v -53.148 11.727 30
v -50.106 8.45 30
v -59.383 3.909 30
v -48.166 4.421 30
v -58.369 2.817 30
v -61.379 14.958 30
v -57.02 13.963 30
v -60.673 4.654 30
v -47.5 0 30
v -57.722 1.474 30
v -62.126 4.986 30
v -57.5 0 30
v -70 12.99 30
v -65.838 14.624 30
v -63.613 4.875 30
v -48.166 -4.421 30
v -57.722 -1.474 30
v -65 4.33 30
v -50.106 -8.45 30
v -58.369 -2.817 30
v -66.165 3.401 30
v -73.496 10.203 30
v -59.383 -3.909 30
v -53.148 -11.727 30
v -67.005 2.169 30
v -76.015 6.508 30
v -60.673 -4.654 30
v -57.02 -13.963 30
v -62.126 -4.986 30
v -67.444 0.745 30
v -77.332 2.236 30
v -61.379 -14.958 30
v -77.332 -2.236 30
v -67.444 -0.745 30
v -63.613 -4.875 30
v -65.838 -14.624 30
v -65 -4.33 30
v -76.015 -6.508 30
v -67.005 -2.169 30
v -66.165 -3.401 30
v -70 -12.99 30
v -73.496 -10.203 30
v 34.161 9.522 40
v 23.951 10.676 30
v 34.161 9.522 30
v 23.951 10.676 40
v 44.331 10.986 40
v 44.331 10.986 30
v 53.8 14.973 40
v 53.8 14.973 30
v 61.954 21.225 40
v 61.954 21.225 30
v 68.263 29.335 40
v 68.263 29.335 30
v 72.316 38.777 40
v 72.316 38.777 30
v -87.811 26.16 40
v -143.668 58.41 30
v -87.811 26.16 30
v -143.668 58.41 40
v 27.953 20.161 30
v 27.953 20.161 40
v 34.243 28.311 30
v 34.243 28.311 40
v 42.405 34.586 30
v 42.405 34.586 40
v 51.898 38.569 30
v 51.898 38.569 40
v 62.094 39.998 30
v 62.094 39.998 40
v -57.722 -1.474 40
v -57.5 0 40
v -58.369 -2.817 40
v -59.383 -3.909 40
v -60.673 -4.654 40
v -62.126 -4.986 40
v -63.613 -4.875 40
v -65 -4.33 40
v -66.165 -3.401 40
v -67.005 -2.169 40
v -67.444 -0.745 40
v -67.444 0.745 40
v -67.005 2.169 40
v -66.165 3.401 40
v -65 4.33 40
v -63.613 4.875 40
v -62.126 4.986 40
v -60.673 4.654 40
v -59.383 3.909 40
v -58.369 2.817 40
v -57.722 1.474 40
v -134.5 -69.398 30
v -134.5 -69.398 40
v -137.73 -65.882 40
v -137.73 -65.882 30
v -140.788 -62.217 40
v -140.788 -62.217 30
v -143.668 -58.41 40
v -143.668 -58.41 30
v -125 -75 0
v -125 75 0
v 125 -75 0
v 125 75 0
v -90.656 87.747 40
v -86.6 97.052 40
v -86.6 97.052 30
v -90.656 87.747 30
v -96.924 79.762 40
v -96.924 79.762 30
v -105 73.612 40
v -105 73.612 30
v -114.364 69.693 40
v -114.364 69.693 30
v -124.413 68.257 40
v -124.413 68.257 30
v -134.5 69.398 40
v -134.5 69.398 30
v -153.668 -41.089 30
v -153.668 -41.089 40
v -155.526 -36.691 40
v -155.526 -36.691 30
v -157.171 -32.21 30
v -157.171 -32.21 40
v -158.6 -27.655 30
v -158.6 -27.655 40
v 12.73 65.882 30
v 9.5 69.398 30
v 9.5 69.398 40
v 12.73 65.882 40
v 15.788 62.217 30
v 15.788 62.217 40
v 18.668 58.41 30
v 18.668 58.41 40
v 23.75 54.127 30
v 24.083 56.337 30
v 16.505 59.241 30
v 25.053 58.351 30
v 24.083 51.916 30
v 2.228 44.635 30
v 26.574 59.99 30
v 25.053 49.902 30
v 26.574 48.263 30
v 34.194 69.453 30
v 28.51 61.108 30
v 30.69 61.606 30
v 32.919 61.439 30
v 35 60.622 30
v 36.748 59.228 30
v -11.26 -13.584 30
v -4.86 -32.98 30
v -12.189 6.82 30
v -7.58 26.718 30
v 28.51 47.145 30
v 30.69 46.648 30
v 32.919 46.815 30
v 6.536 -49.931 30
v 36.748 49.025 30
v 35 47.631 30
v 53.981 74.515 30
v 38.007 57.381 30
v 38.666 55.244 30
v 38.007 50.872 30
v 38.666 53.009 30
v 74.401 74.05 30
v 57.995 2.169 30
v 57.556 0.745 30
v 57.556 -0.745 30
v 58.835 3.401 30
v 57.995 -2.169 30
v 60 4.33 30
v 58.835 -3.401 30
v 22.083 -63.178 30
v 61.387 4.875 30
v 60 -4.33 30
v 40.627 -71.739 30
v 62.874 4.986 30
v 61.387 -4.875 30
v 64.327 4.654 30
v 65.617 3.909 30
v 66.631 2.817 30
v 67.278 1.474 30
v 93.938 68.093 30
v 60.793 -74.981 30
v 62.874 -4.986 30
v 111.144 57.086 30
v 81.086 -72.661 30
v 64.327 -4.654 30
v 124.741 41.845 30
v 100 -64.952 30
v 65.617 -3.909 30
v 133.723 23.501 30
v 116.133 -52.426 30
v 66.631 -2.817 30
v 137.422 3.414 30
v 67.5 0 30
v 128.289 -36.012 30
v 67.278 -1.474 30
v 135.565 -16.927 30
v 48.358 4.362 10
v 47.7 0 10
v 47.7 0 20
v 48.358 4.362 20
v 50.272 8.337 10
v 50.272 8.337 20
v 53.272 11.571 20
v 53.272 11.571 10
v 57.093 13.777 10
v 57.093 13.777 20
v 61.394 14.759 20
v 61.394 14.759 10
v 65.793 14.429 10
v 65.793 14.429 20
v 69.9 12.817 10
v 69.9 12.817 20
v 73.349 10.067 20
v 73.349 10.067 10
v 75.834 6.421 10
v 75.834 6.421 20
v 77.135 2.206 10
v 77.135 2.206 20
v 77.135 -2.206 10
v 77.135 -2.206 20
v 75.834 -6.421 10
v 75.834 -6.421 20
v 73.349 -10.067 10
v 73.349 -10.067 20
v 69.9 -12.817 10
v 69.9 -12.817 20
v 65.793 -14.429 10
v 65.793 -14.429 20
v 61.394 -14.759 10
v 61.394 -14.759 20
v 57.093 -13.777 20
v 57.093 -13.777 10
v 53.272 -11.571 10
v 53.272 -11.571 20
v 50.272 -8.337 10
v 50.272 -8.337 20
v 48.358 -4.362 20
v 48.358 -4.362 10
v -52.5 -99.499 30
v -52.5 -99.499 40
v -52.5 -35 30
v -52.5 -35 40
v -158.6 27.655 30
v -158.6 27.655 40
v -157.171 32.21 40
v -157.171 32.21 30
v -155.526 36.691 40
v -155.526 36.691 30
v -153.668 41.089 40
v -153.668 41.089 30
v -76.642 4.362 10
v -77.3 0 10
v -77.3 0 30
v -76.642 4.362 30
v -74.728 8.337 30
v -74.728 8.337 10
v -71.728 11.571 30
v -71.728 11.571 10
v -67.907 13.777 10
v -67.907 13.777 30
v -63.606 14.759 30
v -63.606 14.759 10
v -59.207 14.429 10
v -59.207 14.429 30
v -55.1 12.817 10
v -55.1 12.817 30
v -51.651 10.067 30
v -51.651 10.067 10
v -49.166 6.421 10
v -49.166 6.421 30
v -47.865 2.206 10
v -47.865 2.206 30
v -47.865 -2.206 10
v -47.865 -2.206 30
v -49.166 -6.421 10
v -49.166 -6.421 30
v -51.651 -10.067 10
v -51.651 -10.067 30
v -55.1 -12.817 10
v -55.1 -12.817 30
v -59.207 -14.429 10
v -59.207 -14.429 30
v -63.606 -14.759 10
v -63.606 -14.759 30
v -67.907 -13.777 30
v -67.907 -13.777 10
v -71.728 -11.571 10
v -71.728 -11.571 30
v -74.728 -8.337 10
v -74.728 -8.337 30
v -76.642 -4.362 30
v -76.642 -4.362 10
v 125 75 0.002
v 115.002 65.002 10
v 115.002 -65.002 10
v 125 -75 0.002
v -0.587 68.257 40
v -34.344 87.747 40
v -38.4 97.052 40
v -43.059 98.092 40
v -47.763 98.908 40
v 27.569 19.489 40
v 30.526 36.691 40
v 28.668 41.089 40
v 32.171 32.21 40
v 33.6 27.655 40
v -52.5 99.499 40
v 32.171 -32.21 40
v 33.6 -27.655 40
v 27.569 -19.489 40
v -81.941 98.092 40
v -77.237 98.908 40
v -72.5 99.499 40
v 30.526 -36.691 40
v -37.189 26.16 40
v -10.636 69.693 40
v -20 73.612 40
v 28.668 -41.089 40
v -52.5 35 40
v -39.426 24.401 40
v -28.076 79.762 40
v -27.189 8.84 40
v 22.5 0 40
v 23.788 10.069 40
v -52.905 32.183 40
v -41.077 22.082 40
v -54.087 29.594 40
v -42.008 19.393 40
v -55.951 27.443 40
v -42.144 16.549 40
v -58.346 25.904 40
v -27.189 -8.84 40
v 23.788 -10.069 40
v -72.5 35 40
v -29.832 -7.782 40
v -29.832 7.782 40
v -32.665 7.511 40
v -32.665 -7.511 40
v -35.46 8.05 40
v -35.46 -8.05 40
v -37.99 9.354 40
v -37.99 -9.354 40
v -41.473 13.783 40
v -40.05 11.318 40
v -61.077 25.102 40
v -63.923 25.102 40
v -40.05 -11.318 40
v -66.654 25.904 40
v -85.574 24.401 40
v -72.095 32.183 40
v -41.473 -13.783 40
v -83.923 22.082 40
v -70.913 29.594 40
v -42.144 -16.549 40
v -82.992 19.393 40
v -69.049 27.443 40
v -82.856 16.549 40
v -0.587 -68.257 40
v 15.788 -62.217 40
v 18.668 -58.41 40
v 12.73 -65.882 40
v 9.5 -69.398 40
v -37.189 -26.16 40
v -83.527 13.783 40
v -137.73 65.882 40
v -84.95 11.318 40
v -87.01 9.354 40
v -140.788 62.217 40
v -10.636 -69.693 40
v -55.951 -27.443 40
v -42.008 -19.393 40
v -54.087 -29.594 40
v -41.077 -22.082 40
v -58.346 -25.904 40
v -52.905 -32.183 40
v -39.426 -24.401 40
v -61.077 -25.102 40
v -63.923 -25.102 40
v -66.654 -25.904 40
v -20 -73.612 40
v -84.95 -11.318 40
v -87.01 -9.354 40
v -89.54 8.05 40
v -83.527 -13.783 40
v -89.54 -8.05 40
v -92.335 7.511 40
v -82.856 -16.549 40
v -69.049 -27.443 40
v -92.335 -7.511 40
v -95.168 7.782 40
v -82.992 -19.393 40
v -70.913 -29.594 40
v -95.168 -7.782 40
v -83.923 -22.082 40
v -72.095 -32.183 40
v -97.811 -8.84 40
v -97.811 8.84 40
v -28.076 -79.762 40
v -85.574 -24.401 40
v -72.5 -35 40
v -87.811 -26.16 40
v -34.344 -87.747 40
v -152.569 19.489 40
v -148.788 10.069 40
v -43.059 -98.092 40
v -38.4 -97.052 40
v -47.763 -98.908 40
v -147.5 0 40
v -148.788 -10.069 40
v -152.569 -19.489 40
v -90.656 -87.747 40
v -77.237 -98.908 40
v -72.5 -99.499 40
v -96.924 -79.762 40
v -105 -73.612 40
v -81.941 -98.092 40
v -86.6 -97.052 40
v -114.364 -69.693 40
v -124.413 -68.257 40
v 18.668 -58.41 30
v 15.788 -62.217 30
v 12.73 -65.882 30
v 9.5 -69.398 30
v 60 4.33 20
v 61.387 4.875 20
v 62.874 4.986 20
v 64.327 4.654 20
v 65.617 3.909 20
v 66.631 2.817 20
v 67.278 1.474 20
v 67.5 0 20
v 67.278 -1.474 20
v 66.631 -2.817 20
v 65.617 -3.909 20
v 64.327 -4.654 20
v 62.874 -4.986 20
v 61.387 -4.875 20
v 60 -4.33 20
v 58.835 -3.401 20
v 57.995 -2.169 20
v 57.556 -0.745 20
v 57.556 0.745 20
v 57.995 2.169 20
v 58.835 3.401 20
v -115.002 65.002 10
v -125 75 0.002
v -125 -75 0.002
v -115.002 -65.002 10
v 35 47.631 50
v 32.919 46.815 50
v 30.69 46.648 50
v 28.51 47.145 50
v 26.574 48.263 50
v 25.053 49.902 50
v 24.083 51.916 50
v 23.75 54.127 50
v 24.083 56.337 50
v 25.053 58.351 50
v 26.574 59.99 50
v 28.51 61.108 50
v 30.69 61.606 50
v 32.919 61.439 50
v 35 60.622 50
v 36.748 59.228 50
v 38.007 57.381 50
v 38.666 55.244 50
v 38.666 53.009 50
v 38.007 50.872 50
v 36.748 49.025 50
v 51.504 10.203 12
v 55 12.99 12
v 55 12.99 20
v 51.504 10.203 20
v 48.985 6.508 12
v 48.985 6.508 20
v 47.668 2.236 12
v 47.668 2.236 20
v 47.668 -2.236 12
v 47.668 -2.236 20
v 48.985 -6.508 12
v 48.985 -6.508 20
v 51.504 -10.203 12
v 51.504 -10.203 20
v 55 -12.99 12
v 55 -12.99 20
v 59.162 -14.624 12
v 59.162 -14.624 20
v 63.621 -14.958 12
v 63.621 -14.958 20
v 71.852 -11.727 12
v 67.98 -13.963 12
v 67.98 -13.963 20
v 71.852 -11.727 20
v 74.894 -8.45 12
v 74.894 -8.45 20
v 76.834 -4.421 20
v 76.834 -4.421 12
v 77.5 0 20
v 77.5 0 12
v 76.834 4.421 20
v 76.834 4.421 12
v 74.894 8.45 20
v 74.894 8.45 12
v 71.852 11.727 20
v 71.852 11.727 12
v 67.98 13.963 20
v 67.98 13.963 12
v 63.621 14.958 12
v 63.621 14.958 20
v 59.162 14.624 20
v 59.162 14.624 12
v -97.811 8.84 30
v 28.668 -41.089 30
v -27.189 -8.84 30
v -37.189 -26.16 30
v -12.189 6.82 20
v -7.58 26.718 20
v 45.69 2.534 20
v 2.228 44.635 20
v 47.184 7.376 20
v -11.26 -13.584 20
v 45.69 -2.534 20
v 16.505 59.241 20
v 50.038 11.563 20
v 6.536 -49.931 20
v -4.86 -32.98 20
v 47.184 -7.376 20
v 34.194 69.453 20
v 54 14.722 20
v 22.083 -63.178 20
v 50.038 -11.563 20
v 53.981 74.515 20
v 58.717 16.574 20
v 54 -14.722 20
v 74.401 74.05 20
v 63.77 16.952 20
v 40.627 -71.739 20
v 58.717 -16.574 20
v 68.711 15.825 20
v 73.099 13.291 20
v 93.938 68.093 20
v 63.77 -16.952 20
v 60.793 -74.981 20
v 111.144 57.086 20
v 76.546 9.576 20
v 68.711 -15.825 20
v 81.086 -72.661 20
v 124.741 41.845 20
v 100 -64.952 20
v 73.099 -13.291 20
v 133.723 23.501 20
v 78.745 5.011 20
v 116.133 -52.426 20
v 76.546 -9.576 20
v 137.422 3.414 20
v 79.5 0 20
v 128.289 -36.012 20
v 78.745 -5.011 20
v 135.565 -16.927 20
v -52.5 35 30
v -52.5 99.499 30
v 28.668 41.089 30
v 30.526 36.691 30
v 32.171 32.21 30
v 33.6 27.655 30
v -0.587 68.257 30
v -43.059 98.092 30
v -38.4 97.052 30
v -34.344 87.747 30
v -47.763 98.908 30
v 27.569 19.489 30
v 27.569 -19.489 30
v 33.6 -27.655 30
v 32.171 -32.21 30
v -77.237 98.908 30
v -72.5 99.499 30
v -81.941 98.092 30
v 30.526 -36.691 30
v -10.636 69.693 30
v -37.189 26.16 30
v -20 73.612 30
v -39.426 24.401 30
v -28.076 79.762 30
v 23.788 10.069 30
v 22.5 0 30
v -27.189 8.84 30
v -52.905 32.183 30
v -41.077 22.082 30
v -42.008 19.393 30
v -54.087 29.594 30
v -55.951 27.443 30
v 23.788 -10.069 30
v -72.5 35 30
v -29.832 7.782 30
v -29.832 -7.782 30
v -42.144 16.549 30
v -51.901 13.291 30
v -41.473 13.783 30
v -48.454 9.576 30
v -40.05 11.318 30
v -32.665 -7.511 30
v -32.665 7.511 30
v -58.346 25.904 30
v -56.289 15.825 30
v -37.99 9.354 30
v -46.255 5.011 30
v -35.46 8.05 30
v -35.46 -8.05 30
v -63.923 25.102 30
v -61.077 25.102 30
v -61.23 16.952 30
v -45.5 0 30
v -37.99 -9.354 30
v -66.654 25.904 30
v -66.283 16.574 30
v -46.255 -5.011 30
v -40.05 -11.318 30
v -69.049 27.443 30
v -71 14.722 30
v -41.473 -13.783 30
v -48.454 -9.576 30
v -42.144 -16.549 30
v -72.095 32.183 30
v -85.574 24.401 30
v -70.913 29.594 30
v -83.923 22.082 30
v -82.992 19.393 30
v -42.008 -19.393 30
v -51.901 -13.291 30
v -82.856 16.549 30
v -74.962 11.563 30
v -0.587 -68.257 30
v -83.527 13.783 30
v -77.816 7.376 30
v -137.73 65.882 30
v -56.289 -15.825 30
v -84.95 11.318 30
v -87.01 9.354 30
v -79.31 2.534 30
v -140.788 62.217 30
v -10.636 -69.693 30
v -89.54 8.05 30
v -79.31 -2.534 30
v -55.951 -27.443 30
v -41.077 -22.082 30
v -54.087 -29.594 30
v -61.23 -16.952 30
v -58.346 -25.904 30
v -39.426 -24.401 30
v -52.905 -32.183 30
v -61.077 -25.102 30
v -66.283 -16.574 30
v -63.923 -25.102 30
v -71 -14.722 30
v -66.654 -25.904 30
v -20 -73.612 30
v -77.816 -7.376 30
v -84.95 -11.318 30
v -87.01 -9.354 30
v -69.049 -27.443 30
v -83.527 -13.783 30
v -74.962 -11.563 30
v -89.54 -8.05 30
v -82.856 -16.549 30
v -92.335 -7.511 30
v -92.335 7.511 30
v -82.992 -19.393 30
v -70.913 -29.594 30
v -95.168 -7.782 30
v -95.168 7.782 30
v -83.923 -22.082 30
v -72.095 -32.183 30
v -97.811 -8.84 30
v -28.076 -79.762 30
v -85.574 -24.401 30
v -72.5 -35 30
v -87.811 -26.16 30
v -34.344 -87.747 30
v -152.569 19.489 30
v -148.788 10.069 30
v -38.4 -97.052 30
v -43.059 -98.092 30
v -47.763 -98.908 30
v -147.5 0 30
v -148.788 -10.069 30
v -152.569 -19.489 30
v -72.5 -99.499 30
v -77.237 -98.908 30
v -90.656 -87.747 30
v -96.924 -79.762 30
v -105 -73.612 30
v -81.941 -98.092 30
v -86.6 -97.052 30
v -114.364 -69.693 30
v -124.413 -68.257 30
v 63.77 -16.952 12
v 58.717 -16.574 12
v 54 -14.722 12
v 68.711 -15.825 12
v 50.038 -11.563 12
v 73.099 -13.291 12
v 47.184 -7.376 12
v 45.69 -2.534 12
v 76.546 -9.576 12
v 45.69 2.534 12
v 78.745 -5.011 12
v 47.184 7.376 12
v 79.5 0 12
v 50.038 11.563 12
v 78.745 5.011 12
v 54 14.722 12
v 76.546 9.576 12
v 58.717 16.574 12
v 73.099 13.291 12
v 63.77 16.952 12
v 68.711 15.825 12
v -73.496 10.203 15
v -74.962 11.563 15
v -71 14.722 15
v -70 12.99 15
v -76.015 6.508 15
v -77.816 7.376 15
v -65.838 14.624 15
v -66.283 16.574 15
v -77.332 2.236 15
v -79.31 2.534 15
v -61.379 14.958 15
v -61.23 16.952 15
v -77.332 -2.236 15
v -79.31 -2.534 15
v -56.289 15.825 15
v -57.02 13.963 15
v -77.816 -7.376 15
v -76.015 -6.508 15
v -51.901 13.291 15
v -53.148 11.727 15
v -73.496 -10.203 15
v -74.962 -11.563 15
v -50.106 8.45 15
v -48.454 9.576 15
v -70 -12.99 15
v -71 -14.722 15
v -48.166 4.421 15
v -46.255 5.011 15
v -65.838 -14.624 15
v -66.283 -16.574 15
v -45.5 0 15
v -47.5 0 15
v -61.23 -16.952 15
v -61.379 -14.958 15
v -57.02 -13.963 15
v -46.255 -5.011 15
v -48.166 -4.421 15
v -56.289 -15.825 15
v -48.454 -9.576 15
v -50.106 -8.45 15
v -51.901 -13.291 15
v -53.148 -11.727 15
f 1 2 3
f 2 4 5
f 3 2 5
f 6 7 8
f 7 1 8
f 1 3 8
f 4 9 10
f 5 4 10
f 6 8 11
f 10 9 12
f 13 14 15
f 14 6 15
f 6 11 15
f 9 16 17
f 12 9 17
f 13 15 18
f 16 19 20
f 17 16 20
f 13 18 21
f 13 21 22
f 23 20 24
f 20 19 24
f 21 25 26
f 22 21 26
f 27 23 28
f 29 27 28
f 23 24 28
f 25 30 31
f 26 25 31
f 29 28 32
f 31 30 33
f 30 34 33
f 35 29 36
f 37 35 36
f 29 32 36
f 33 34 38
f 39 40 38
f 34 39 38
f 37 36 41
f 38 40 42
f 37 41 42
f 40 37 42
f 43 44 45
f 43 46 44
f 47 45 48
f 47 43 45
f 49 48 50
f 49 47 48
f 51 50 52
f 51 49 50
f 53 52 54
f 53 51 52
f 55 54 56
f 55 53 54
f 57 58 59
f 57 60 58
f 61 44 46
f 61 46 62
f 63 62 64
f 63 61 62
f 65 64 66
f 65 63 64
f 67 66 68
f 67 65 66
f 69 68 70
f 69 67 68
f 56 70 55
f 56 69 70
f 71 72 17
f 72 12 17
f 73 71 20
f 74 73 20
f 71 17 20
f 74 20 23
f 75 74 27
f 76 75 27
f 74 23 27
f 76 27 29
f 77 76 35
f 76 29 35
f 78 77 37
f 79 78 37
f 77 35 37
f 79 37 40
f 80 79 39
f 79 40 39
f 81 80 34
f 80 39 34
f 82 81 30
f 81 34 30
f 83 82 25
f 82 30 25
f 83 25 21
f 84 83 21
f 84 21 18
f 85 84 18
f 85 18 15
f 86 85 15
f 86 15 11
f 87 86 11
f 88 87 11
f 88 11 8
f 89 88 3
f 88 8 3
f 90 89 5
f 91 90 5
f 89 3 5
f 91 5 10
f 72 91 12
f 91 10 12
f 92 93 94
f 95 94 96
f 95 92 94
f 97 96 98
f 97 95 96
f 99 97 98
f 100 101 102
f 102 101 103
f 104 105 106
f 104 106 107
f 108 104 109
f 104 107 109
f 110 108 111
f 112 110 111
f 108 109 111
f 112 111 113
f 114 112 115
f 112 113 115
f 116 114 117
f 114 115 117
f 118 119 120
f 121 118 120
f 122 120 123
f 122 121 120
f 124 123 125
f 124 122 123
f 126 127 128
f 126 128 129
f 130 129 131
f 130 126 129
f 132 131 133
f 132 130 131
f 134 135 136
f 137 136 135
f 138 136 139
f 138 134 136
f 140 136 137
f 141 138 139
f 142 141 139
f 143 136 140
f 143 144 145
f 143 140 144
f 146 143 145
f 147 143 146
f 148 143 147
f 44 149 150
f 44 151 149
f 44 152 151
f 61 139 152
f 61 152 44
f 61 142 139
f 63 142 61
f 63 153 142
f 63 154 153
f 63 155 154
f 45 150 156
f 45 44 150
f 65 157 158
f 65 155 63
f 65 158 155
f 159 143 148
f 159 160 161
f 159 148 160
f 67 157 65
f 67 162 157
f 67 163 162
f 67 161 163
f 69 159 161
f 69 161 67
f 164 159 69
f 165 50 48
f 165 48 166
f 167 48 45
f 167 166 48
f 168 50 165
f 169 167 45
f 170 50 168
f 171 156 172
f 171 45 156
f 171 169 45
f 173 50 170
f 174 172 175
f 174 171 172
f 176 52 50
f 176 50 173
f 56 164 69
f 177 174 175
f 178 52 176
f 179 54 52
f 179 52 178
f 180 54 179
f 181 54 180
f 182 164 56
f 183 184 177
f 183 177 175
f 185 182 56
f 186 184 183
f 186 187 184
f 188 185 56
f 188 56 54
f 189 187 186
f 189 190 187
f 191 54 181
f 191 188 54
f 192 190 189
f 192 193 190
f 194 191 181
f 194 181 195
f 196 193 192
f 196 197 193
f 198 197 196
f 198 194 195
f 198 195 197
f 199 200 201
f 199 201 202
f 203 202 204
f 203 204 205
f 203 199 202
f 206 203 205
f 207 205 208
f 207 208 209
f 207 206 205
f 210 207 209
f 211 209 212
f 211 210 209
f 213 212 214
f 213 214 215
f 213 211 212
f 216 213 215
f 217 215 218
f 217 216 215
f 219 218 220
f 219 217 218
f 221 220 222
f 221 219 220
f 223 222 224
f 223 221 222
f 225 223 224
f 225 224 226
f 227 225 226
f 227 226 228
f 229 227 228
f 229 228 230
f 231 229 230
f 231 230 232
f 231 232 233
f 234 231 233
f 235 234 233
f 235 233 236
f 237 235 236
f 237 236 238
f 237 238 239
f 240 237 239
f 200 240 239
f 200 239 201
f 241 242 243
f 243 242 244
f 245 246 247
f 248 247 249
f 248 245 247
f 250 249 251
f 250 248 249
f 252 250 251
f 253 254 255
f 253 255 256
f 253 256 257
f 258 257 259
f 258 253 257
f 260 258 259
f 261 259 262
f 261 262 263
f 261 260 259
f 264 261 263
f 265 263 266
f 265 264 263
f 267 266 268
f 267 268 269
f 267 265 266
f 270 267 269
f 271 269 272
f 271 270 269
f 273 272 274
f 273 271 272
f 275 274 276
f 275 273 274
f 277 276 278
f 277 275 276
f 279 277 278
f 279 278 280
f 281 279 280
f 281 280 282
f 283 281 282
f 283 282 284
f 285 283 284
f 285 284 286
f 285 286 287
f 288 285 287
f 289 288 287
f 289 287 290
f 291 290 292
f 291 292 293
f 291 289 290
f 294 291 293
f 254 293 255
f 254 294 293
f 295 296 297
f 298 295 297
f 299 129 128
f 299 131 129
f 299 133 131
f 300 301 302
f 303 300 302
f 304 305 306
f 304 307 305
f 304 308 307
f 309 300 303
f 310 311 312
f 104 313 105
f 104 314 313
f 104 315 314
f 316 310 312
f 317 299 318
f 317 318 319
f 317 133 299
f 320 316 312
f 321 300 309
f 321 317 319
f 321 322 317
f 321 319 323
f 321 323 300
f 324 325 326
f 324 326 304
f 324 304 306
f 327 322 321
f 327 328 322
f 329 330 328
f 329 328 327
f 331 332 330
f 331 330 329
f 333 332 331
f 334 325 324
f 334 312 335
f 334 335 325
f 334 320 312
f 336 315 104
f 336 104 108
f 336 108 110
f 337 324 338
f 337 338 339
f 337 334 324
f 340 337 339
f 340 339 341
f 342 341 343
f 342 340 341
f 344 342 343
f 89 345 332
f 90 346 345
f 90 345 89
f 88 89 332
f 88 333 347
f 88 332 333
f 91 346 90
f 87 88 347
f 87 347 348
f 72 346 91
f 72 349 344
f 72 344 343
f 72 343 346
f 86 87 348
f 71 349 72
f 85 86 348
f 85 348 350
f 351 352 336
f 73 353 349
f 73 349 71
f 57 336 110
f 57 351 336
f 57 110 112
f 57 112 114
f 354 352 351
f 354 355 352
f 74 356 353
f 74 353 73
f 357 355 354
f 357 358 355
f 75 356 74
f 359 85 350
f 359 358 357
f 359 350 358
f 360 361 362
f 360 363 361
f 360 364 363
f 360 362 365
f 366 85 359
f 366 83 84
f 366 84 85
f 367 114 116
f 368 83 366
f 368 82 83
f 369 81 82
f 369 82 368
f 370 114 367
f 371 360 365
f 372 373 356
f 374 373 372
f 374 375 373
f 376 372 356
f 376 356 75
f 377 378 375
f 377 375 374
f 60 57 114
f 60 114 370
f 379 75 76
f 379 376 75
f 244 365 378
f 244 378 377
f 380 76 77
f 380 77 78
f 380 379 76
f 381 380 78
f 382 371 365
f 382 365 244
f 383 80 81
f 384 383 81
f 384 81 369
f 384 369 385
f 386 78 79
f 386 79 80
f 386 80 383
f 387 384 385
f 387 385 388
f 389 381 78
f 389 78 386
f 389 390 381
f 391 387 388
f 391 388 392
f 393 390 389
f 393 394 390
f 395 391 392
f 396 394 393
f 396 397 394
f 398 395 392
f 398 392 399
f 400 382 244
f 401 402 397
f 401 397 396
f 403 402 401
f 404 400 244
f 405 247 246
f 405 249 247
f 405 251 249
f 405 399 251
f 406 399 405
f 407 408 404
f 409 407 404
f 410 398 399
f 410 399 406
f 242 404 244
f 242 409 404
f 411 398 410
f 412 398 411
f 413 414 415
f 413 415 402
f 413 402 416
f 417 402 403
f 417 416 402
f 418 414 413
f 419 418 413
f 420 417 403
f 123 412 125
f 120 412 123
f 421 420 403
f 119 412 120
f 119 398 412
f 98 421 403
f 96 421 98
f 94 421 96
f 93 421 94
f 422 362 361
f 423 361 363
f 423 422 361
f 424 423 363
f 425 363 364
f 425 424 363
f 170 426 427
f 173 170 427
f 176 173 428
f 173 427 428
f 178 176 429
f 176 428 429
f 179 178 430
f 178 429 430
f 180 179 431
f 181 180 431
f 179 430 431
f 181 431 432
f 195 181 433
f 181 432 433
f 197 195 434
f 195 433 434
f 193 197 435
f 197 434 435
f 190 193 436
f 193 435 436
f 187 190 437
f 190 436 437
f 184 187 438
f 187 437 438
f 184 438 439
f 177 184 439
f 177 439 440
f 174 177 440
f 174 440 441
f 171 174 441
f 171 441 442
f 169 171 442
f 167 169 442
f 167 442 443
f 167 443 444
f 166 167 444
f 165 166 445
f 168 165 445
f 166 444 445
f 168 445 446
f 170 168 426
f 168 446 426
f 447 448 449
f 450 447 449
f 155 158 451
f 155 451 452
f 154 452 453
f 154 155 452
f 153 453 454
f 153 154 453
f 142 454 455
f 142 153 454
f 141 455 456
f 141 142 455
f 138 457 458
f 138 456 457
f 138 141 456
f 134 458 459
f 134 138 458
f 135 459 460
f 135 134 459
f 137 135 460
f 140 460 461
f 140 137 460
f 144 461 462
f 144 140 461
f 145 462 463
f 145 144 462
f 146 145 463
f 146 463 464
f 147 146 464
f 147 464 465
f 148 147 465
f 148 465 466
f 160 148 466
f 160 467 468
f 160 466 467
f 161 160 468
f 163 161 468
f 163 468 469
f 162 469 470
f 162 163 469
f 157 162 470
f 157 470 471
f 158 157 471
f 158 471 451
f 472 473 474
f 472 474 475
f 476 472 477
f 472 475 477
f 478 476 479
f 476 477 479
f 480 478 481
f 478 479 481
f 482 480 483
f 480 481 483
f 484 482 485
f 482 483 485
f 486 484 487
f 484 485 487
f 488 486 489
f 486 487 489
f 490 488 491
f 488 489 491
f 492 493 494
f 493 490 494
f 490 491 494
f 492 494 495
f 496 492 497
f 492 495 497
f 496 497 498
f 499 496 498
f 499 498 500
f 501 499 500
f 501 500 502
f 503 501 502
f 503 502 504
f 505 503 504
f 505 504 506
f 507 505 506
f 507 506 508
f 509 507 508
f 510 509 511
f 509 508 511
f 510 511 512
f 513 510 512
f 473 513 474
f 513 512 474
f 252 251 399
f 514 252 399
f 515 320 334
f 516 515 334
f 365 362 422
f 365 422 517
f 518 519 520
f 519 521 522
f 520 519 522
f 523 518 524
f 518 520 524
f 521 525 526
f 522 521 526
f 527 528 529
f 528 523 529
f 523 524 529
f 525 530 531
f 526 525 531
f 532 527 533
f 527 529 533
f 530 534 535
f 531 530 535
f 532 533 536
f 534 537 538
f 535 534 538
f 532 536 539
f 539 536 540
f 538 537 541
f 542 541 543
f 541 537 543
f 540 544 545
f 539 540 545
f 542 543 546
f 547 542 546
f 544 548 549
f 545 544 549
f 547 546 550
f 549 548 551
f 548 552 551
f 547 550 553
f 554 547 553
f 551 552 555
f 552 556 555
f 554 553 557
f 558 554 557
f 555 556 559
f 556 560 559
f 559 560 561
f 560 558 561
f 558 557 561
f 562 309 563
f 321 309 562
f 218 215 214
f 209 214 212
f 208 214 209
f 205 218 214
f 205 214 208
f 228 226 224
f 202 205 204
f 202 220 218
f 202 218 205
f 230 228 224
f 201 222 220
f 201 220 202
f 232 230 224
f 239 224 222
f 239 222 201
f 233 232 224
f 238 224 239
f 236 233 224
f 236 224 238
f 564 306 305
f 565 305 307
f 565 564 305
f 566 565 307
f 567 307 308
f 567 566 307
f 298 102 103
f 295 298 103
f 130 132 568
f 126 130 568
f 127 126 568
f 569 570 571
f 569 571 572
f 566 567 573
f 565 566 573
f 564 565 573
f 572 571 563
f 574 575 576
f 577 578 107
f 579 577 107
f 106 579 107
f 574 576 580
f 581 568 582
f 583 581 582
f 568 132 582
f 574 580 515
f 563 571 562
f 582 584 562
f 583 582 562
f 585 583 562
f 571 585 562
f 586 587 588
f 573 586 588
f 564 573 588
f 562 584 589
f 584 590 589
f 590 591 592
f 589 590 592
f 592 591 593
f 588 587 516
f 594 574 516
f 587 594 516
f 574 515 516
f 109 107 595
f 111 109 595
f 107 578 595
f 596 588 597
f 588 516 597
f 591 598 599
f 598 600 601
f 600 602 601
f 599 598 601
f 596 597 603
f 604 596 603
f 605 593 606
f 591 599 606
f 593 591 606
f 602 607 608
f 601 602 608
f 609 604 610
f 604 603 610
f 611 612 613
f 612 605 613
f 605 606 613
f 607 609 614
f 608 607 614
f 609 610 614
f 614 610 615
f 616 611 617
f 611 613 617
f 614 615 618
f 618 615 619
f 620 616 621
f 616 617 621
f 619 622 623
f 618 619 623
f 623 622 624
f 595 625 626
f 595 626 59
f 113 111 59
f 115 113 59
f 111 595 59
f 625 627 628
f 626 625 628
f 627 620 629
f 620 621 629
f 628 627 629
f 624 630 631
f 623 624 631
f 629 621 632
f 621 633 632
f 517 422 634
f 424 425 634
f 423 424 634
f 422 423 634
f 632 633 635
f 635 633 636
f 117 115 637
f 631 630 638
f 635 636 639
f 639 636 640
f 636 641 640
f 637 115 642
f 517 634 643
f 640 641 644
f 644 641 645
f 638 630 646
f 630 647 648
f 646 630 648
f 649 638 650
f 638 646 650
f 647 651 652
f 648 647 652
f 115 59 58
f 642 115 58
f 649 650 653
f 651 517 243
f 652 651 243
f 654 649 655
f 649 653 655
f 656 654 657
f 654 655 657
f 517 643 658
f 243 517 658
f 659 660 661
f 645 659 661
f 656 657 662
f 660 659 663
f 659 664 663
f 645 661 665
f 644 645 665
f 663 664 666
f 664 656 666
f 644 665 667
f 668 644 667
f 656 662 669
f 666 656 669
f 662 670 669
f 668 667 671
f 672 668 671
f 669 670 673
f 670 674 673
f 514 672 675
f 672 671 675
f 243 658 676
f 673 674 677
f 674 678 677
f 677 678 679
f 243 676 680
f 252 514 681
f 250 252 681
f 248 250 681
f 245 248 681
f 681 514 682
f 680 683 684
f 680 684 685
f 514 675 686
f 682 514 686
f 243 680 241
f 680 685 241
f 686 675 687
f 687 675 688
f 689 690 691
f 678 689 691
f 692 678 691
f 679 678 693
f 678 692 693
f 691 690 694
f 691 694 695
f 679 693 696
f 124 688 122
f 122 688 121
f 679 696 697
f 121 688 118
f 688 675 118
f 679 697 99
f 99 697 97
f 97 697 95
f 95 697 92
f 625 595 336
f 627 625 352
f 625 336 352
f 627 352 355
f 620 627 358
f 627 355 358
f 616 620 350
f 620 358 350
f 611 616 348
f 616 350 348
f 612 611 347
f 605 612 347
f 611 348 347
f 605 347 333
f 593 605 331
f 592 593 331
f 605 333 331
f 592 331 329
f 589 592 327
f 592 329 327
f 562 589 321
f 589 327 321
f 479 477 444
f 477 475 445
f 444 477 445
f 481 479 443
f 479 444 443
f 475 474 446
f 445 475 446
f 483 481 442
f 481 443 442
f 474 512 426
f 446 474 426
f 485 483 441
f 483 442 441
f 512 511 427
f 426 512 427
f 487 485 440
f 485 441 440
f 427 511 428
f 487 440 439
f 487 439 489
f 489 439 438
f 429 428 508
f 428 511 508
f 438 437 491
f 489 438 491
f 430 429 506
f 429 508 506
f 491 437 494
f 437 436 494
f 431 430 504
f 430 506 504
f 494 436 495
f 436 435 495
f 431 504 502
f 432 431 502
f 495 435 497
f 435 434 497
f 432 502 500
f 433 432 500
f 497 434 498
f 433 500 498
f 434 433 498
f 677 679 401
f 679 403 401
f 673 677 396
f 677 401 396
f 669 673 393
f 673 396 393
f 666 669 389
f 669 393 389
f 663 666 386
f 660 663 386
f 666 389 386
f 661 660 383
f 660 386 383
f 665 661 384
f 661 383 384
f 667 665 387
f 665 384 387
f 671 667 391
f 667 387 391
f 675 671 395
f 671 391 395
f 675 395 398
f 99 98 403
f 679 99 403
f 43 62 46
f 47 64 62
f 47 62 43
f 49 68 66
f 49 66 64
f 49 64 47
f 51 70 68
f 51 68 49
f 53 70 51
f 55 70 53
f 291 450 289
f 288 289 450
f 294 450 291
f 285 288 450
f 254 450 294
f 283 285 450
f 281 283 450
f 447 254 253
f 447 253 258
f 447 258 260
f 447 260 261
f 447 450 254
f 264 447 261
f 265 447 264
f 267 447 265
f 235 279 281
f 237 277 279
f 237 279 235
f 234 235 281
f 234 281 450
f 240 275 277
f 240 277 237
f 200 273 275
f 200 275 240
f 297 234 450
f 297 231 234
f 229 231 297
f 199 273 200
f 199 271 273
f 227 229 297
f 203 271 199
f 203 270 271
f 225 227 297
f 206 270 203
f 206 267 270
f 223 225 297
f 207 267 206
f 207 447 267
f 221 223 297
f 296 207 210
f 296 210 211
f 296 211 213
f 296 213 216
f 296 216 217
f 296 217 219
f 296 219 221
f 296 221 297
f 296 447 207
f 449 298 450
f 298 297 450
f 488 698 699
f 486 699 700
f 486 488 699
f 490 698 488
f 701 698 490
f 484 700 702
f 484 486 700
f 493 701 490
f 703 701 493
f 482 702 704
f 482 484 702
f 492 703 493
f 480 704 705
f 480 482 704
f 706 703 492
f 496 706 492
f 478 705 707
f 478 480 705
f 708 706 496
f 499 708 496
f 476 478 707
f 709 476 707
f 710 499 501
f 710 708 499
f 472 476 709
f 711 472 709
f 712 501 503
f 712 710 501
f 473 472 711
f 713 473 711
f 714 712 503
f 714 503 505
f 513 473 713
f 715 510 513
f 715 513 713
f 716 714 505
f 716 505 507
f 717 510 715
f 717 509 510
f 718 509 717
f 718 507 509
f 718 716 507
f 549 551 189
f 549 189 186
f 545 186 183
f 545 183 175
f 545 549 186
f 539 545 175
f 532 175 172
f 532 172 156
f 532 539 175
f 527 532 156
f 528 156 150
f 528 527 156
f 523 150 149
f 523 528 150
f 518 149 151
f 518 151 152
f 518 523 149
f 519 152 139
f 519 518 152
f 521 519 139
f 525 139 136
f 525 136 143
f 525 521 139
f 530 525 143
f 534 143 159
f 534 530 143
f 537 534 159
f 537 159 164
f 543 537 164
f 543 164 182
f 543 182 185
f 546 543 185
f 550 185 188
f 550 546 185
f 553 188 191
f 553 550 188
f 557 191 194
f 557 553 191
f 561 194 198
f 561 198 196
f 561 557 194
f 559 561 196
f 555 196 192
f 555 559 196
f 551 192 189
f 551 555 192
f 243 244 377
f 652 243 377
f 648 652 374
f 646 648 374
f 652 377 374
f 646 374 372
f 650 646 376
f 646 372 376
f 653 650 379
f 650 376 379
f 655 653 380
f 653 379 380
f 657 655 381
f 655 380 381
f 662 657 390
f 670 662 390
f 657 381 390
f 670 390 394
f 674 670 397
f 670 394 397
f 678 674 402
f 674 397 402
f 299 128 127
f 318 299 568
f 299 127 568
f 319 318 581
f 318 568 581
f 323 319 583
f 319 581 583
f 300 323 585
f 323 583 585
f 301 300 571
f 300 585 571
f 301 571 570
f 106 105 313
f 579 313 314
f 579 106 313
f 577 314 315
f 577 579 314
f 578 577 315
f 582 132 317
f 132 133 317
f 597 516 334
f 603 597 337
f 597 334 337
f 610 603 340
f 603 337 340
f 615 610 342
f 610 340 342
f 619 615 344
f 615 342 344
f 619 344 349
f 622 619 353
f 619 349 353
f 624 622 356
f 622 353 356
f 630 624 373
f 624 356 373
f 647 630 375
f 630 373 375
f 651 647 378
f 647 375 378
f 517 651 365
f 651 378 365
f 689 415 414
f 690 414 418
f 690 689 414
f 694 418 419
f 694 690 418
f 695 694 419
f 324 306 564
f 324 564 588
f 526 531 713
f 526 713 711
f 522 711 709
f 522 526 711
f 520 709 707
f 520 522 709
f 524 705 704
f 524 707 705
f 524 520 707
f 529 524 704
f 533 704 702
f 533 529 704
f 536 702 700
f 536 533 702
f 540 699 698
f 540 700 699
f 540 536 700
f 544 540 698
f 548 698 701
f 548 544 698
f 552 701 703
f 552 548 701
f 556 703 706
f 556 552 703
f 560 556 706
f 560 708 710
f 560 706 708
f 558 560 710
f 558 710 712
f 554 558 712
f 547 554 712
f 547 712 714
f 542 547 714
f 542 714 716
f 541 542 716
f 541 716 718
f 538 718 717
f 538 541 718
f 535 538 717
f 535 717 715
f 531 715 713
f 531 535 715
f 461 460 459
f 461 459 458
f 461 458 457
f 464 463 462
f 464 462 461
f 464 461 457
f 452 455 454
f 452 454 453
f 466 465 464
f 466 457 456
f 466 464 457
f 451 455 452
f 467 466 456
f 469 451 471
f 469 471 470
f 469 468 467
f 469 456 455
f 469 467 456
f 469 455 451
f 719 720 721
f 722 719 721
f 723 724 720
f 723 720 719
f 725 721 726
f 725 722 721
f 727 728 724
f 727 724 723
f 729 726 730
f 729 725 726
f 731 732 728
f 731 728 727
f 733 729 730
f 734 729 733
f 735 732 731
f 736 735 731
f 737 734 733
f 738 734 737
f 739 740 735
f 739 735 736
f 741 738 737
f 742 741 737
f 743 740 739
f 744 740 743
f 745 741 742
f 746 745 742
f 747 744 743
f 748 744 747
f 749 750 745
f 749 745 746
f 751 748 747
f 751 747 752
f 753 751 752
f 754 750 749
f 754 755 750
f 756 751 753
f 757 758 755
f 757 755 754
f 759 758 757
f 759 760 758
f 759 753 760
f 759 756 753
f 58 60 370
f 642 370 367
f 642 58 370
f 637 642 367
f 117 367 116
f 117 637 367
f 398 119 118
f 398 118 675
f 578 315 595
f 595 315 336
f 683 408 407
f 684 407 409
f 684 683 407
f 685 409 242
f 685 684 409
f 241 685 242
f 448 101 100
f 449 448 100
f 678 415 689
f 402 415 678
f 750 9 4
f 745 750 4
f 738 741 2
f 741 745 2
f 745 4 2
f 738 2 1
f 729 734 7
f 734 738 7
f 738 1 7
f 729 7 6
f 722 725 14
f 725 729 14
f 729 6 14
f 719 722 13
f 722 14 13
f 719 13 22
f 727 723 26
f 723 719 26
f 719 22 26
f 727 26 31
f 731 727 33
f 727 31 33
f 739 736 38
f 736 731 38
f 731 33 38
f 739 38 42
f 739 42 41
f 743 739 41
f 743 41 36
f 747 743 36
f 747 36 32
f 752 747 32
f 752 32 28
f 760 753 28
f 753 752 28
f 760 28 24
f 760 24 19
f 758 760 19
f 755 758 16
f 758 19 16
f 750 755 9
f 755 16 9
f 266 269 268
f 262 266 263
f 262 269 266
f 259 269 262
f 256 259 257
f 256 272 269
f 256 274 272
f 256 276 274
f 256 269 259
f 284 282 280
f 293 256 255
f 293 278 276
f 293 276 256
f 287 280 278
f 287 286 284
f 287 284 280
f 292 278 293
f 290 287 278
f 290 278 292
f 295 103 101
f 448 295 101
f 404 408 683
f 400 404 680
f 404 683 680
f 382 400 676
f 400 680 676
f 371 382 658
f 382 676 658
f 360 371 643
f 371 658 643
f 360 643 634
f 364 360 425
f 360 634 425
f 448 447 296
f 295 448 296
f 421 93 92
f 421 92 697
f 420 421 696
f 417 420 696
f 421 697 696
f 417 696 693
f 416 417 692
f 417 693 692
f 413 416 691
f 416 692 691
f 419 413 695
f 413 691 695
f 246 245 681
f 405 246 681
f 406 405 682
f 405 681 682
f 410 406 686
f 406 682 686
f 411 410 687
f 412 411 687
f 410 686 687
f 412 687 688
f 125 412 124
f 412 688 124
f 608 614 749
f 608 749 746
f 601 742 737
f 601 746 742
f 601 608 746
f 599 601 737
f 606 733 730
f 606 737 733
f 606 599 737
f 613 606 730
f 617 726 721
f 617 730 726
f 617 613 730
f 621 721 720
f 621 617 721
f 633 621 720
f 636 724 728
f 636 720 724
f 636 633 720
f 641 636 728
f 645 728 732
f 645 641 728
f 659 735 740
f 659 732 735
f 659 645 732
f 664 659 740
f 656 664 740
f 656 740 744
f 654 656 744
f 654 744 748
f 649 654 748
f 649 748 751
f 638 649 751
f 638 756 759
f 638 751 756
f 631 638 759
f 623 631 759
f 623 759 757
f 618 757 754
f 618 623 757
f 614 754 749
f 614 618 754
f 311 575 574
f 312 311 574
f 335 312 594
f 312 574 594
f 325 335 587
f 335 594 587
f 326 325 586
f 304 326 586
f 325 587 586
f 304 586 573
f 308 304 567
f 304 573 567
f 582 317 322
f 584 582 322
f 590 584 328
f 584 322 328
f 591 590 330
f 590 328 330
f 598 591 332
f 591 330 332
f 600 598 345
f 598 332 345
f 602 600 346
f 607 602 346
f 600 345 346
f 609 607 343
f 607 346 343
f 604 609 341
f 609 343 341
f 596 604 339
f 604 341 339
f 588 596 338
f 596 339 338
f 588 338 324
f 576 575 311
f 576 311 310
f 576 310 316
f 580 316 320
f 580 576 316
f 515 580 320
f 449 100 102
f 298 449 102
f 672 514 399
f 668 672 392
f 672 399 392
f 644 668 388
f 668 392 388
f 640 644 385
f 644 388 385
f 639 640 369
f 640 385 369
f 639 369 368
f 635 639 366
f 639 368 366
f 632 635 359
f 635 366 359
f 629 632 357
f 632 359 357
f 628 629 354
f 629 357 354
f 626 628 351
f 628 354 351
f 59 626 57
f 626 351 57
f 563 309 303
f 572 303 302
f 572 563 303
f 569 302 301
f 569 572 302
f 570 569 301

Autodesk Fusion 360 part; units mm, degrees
sketch "Base" plane through (0, 0, 0) normal (0, 0, 1) x (1, 0, 0) in component "Base"
  line L0 (125, 75) -> (-125, 75)
  line L1 (-125, 75) -> (-125, -75)
  line L2 (-125, -75) -> (125, -75)
  line L3 (125, -75) -> (125, 75)
  line L4 (125, 75) -> (-125, -75) construction
  line L5 (-125, 75) -> (125, -75) construction
  dimension "d1" = 250
  dimension "d2" = 150
extrude "Extrude1" add sketch "Base" along normal blind 10 makes body 1 in component "Base"
sketch "Wheels" plane through (0, 0, 10) normal (0, 0, 1) x (-1, 0, 0) in component "Base"
  line L0 (-125, 75) -> (-125, -75)
  line L1 (-125, -75) -> (125, -75)
  line L2 (125, -75) -> (125, 75)
  line L3 (125, 75) -> (-125, 75)
  line L4 (0, 0) -> (-125, 0) construction
  line L5 (0, 0) -> (125, 0) construction
  line L6 (0, -75) -> (0, 75) construction
  circle A0 centre (-62.5, 0) radius 75
  circle A1 centre (62.5, 0) radius 75
  circle A2 centre (-62.5, 0) radius 15
  circle A3 centre (62.5, 0) radius 15
  dimension "d5" = 150
  dimension "d6" = 30
  dimension "d7" = 30
extrude "Extrude2" add sketch "Wheels" along normal blind 20 and the other way blind -10 separate body contours L0 A0 A1 | L0 A0 | A0 A1 makes body 2 in component "Base"
copy_body "CutPasteBodies1" bodies 2 removing the originals makes body 3 in component "Crank"
extrude "Extrude3" add sketch "Wheels" along normal blind 10 contours A2 bodies 1 in component "Base"
extrude "Extrude1'" add sketch "Wheels" along normal blind 30 and the other way blind -20 separate body contours L2 A0 A1 | A0 A1 | L2 A1 makes body 4 in component "Snowflake"
extrude "Extrude4" add sketch "Wheels" along normal blind 20 contours A3 bodies 1 in component "Base"
move_face "OffsetFaces1" offset 25 1 faces at (-137.1273, -7.4676, 36.6667) on bodies 4 in component "Snowflake"
move_face "OffsetFaces2" offset 20 1 faces at (-77.4814, -0.7477, 33.3333) on bodies 4 in component "Snowflake"
move_face "OffsetFaces1'" offset 20 1 faces at (47.5186, 0.7477, 26.6667) on bodies 3 in component "Crank"
sketch "Holder" plane through (0, 0, 30) normal (0, 0, -1) x (1, 0, 0) in component "Snowflake"
  circle A0 centre (-62.5, 0) radius 100
  circle A1 centre (-62.5, 0) radius 15
  circle A2 centre (-62.5, 0) radius 17
  dimension "d25" = 30
  dimension "d26" = 2
extrude "Extrude3'" add sketch "Holder" along normal blind 15 contours A2 bodies 4 in component "Snowflake"
sketch "Holder (2)" plane through (0, 0, 20) normal (0, 0, -1) x (1, 0, 0) in component "Crank"
  circle A0 centre (62.5, 0) radius 75
  circle A1 centre (62.5, 0) radius 15
  circle A2 centre (62.5, 0) radius 17
  dimension "d29" = 30
  dimension "d30" = 2
extrude "Extrude1''" add sketch "Holder (2)" along normal blind 8 contours A2 bodies 3 in component "Crank"
move_face "OffsetFaces1''" offset -0.2 1 faces at (-77.4814, 0.7477, 23.3333) on bodies 1 in component "Base"
move_face "OffsetFaces2'" offset -0.2 1 faces at (47.5186, -0.7477, 13.3333) on bodies 1 in component "Base"
sketch "Middle" plane through (0, 0, 30) normal (0, 0, 1) x (-1, 0, 0) in component "Crank"
  circle A0 centre (-62.5, 0) radius 75
  circle A1 centre (-62.5, 0) radius 40
  dimension "d43" = 80
extrude "Extrude2'" add sketch "Middle" along normal blind 10 contours A1 bodies 3 in component "Crank"
extrude "Extrude4'" cut sketch "Middle" along normal blind 10 contours A1 bodies 4 in component "Snowflake"
pattern_circular "C-Pattern1" count 6 over 360 about axis through (-62.5, 0, 40) along (0, 0, 1) of "Extrude4'" in component "Snowflake"
sketch "Pin" plane through (0, 0, 30) normal (0, 0, 1) x (-1, 0, 0) in component "Crank"
  circle A0 centre (-62.5, 0) radius 40
  circle A1 centre (-62.5, 0) radius 75
  circle A2 centre (-125, 0) radius 7.5
  dimension "d50" = 15
extrude "Extrude3''" add sketch "Pin" along normal blind 20 contours A2 bodies 3 in component "Crank"
sketch "Middle cut" plane through (0, 0, 40) normal (0, 0, 1) x (-1, 0, 0) in component "Crank"
  circle A0 centre (-62.5, 0) radius 40
  arc A1 (-91.0202, -28.0464) -> (-91.1738, 27.8893) centre (-120.1291, -0.1582) ccw
  circle A2 centre (-62.5, 0) radius 40
sketch "Pin holes" plane through (0, 0, 40) normal (0, 0, 1) x (-1, 0, 0) in component "Snowflake"
  arc A0 (-9.4998, 69.3976) -> (38.3998, 97.0525) centre (0, 108.2532) ccw
  arc A1 (-9.4998, 69.3976) -> (-33.6, 27.6548) centre (62.5, 0) ccw
  arc A2 (-33.6, -27.6548) -> (-33.6, 27.6548) centre (-62.5, 0) ccw
  arc A3 (-33.6, -27.6548) -> (-9.4998, -69.3976) centre (62.5, 0) ccw
  arc A4 (38.3998, -97.0525) -> (-9.4998, -69.3976) centre (0, -108.2532) ccw
  arc A5 (38.3998, -97.0525) -> (86.6002, -97.0525) centre (62.5, 0) ccw
  arc A6 (134.4998, -69.3976) -> (86.6002, -97.0525) centre (125, -108.2532) ccw
  arc A7 (134.4998, -69.3976) -> (158.6, -27.6548) centre (62.5, 0) ccw
  arc A8 (158.6, 27.6548) -> (158.6, -27.6548) centre (187.5, 0) ccw
  arc A9 (158.6, 27.6548) -> (134.4998, 69.3976) centre (62.5, 0) ccw
  arc A10 (86.6002, 97.0525) -> (134.4998, 69.3976) centre (125, 108.2532) ccw
  arc A11 (86.6002, 97.0525) -> (38.3998, 97.0525) centre (62.5, 0) ccw
  circle A12 centre (62.5, 0) radius 25
  line L0 (62.5, -100) -> (62.5, 100) construction
  line L1 (62.5, -100) -> (72.5, -100) construction
  line L2 (62.5, -100) -> (52.5, -100) construction
  line L3 (72.5, -100) -> (72.5, -35)
  line L4 (52.5, -100) -> (52.5, -35)
  line L5 (62.5, -25) -> (62.5, -25)
  arc A13 (72.5, -35) -> (62.5, -25) centre (62.5, -35) ccw
  arc A14 (62.5, -25) -> (52.5, -35) centre (62.5, -35) ccw
  line L6 (144.1025, -58.6603) -> (87.8109, -26.1603)
  line L7 (154.1025, -41.3397) -> (97.8109, -8.8397)
  arc A15 (97.8109, -8.8397) -> (84.1506, -12.5) centre (92.8109, -17.5) ccw
  arc A16 (84.1506, -12.5) -> (87.8109, -26.1603) centre (92.8109, -17.5) ccw
  line L8 (149.1025, -50) -> (144.1025, -58.6603) construction
  line L9 (149.1025, -50) -> (154.1025, -41.3397) construction
  line L10 (154.1025, 41.3397) -> (97.8109, 8.8397)
  line L11 (144.1025, 58.6603) -> (87.8109, 26.1603)
  arc A17 (87.8109, 26.1603) -> (84.1506, 12.5) centre (92.8109, 17.5) ccw
  arc A18 (84.1506, 12.5) -> (97.8109, 8.8397) centre (92.8109, 17.5) ccw
  line L12 (149.1025, 50) -> (154.1025, 41.3397) construction
  line L13 (149.1025, 50) -> (144.1025, 58.6603) construction
  line L14 (72.5, 100) -> (72.5, 35)
  line L15 (52.5, 100) -> (52.5, 35)
  arc A19 (52.5, 35) -> (62.5, 25) centre (62.5, 35) ccw
  arc A20 (62.5, 25) -> (72.5, 35) centre (62.5, 35) ccw
  line L16 (62.5, 100) -> (72.5, 100) construction
  line L17 (62.5, 100) -> (52.5, 100) construction
  line L18 (-19.1025, 58.6603) -> (37.1891, 26.1603)
  line L19 (-29.1025, 41.3397) -> (27.1891, 8.8397)
  arc A21 (27.1891, 8.8397) -> (40.8494, 12.5) centre (32.1891, 17.5) ccw
  arc A22 (40.8494, 12.5) -> (37.1891, 26.1603) centre (32.1891, 17.5) ccw
  line L20 (-24.1025, 50) -> (-19.1025, 58.6603) construction
  line L21 (-24.1025, 50) -> (-29.1025, 41.3397) construction
  line L22 (-29.1025, -41.3397) -> (27.1891, -8.8397)
  line L23 (-19.1025, -58.6603) -> (37.1891, -26.1603)
  arc A23 (37.1891, -26.1603) -> (40.8494, -12.5) centre (32.1891, -17.5) ccw
  arc A24 (40.8494, -12.5) -> (27.1891, -8.8397) centre (32.1891, -17.5) ccw
  line L24 (-24.1025, -50) -> (-29.1025, -41.3397) construction
  line L25 (-24.1025, -50) -> (-19.1025, -58.6603) construction
  dimension "d56" = 50
  dimension "d59" = 10
  dimension "d60" = 10
  dimension "d61" = 10
  dimension "d63" = 360
extrude "Extrude5" cut sketch "Pin holes" against normal blind 10 contours A1 L18 L19 A21 A22 | A11 L14 L15 A19 A20 | A3 L22 L23 A23 A24 | A9 L10 L11 A17 A18 | A5 L3 L4 A13 A14 | A7 L6 L7 A15 A16 bodies 4 in component "Snowflake"
extrude "Extrude5'" cut sketch "Middle cut" against normal blind 10 contours A0 A1 A2 picked at (-41.7869, 2.8878) bodies 3 in component "Crank"
chamfer "Chamfer1" distance 10 angle 45 4 edges at (0, -75, 10) (125, 0, 10) (0, 75, 10) (-125, 0, 10) on bodies 1 in component "Base"
extrude "Extrude4''" [suppressed] in component "Crank"
component "Base" placed x (1, 0, 0) y (0, 1, 0) z (0, 0, 1) at (0, 0, 0)
component "Snowflake" placed x (1, 0, 0) y (0, 1, 0) z (0, 0, 1) at (0, 0, 0)
component "Crank" placed x (-0.5, 0.866025, 0) y (-0.866025, -0.5, 0) z (0, 0, 1) at (93.75, -54.1266, 0)
